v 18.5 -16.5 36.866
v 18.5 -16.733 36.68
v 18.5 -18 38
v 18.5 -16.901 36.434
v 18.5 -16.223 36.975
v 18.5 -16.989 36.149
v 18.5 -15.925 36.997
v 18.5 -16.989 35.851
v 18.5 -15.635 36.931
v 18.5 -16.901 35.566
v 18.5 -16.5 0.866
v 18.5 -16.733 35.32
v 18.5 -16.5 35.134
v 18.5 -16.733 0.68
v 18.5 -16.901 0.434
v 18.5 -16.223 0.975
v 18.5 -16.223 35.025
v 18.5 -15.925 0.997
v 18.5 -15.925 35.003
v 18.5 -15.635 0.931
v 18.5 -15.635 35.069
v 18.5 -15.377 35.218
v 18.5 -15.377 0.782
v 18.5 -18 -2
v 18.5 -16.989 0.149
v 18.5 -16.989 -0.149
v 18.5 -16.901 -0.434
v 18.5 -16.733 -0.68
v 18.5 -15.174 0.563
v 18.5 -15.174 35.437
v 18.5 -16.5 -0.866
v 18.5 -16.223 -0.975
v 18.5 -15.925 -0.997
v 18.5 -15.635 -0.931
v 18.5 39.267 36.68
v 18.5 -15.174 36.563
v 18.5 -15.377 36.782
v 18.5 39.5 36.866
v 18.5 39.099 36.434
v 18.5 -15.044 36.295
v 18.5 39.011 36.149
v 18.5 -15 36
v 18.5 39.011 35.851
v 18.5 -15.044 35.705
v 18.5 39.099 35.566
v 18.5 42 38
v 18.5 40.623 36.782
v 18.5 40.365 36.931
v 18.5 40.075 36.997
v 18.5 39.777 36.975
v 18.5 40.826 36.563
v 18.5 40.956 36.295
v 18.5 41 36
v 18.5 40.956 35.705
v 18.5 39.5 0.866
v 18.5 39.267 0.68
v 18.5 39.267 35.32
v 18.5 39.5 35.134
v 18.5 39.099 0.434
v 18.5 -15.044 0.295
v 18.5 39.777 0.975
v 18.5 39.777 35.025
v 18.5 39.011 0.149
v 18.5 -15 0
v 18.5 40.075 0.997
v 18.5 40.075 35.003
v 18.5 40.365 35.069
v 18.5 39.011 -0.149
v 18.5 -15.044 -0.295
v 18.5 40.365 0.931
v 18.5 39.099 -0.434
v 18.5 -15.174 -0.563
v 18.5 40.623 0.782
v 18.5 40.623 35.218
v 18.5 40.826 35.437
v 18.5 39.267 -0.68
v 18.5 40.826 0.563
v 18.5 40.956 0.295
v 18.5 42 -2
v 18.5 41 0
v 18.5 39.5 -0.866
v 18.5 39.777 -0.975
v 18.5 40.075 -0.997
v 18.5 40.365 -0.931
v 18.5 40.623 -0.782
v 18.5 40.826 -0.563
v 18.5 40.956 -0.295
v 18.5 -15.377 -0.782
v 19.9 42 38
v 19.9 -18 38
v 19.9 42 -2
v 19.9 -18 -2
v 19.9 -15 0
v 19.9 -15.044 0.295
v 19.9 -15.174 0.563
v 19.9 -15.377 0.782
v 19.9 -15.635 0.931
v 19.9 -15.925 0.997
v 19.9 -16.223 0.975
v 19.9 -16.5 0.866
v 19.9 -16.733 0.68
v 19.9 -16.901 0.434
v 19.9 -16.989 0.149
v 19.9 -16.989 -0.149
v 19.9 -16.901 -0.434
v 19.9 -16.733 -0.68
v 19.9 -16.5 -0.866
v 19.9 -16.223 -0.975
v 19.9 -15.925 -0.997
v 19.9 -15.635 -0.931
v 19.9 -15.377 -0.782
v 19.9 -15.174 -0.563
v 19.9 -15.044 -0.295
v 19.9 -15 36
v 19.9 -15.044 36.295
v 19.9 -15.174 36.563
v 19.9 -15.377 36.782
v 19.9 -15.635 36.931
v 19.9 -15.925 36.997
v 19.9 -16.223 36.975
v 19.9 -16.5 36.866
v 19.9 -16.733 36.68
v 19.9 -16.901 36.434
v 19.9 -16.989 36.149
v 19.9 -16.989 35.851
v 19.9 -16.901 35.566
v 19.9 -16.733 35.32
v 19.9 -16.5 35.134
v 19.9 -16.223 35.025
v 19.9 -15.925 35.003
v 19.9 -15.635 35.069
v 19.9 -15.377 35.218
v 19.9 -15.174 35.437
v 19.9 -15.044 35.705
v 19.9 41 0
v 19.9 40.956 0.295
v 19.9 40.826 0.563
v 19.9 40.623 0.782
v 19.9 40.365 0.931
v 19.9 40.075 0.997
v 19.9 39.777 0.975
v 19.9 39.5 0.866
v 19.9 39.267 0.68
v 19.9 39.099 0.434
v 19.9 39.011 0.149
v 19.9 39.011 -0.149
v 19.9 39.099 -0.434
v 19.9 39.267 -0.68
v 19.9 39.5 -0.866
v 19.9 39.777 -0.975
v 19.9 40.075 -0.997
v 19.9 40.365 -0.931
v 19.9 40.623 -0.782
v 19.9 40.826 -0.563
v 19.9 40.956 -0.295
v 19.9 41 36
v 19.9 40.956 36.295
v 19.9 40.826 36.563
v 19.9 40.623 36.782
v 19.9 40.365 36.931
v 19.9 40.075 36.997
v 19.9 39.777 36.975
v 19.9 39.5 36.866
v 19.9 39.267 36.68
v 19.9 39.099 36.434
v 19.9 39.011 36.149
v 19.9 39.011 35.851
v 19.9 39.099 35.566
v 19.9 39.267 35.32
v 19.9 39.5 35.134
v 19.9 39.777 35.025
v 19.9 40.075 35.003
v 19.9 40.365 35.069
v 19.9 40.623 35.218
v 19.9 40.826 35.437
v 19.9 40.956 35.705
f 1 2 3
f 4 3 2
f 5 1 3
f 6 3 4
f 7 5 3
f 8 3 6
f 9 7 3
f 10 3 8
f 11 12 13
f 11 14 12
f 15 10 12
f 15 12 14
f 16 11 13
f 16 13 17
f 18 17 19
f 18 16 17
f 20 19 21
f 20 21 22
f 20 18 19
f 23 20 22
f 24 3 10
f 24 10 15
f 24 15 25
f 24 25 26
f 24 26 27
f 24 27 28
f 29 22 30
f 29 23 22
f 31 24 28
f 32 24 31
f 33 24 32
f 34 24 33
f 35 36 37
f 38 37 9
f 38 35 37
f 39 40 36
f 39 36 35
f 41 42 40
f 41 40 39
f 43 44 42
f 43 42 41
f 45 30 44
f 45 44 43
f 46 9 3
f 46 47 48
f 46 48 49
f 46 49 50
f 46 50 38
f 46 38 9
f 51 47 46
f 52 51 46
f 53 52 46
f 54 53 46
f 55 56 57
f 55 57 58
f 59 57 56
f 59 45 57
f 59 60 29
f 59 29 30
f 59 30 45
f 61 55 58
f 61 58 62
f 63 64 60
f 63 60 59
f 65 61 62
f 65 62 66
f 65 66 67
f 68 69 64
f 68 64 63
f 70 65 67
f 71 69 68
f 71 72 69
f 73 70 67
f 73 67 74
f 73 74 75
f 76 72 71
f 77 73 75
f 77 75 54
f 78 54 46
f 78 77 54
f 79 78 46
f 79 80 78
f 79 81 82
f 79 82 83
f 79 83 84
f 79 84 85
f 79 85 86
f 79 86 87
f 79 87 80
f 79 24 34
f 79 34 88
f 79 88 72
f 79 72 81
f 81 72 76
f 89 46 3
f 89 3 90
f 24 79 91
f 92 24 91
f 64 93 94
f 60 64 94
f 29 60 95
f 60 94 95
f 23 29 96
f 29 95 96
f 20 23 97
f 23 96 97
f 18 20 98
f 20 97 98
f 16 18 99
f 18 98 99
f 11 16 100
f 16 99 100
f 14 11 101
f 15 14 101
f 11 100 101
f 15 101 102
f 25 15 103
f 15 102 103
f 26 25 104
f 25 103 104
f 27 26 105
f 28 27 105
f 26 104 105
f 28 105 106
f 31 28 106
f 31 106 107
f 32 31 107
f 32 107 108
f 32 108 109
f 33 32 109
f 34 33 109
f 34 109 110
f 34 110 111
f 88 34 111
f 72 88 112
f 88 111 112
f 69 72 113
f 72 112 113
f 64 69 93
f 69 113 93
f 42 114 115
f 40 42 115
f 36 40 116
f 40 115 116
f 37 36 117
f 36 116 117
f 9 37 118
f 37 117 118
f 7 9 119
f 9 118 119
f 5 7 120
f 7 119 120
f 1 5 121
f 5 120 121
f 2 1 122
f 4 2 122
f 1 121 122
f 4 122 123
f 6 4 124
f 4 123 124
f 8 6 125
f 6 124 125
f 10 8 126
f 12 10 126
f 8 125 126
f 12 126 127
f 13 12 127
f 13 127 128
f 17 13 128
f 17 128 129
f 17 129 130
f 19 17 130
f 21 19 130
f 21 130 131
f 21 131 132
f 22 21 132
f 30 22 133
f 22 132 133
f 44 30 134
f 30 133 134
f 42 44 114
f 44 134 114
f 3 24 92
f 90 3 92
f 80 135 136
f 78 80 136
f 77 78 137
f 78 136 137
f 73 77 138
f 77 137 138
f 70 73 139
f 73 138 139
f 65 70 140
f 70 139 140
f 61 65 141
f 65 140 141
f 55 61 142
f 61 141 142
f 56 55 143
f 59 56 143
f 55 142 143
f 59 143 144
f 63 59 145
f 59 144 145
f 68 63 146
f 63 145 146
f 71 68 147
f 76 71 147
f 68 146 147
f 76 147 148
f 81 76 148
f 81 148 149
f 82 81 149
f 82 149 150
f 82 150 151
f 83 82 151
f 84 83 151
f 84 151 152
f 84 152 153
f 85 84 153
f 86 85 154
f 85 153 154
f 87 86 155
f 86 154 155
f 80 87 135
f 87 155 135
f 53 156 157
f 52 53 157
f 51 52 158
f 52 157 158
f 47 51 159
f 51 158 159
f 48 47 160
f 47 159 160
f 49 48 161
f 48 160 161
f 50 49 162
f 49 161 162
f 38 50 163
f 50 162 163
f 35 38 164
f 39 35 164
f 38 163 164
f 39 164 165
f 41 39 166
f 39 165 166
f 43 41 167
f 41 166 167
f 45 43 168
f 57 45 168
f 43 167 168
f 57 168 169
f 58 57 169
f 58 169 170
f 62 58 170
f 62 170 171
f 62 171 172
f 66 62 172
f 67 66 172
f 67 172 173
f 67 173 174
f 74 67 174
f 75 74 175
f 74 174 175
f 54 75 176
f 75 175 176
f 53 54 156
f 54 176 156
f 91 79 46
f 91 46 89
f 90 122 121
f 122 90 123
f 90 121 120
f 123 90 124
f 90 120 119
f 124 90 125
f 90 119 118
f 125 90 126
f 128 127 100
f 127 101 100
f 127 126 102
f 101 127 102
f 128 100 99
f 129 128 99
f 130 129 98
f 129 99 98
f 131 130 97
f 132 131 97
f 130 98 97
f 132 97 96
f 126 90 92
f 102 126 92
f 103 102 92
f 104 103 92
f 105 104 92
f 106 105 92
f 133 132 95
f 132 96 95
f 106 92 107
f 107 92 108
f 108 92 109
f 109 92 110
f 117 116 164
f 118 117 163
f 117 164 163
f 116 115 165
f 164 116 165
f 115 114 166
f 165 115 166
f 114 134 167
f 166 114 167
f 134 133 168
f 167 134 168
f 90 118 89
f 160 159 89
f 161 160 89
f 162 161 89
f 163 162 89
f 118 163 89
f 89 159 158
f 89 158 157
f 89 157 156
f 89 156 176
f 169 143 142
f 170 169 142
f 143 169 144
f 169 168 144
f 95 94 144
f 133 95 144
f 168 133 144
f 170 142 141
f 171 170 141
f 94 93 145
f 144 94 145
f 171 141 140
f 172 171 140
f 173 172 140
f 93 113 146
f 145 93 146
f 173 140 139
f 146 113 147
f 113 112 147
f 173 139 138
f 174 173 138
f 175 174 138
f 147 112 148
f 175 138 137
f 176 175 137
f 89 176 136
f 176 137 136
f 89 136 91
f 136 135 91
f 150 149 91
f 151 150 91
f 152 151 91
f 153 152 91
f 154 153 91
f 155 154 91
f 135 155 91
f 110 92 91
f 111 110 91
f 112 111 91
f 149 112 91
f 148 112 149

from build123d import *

# Parameters (mm, degrees)
SKETCH_R      = 1
EXTRUDE_DEPTH = 1.4
BOX001_W      = 1.4
BOX001_H      = 60
BOX001_DEPTH  = 40


with BuildPart() as extrude_body:
    # Sketch (on Face2 of Box001) → Extrude (new body)
    with BuildSketch(Plane.YZ.offset(1.4)):
        with Locations((2, 38)):
            Circle(SKETCH_R)
        with Locations((58, 38)):
            Circle(SKETCH_R)
        with Locations((58, 2)):
            Circle(SKETCH_R)
        with Locations((2, 2)):
            Circle(SKETCH_R)
    extrude(amount=-EXTRUDE_DEPTH)


with BuildPart() as board002:
    # Box001 → Box001 (new body)
    with BuildSketch(Plane.XY):
        with Locations((0.7, 30)):
            Rectangle(BOX001_W, BOX001_H)
    extrude(amount=BOX001_DEPTH)

    # Cut: cut Extrude body
    add(extrude_body.part, mode=Mode.SUBTRACT)


with BuildPart() as board002_1:
    # Cut placement: moved
    add(board002.part.moved(Location((18.5, -18, -2))))


solid = board002_1.part
